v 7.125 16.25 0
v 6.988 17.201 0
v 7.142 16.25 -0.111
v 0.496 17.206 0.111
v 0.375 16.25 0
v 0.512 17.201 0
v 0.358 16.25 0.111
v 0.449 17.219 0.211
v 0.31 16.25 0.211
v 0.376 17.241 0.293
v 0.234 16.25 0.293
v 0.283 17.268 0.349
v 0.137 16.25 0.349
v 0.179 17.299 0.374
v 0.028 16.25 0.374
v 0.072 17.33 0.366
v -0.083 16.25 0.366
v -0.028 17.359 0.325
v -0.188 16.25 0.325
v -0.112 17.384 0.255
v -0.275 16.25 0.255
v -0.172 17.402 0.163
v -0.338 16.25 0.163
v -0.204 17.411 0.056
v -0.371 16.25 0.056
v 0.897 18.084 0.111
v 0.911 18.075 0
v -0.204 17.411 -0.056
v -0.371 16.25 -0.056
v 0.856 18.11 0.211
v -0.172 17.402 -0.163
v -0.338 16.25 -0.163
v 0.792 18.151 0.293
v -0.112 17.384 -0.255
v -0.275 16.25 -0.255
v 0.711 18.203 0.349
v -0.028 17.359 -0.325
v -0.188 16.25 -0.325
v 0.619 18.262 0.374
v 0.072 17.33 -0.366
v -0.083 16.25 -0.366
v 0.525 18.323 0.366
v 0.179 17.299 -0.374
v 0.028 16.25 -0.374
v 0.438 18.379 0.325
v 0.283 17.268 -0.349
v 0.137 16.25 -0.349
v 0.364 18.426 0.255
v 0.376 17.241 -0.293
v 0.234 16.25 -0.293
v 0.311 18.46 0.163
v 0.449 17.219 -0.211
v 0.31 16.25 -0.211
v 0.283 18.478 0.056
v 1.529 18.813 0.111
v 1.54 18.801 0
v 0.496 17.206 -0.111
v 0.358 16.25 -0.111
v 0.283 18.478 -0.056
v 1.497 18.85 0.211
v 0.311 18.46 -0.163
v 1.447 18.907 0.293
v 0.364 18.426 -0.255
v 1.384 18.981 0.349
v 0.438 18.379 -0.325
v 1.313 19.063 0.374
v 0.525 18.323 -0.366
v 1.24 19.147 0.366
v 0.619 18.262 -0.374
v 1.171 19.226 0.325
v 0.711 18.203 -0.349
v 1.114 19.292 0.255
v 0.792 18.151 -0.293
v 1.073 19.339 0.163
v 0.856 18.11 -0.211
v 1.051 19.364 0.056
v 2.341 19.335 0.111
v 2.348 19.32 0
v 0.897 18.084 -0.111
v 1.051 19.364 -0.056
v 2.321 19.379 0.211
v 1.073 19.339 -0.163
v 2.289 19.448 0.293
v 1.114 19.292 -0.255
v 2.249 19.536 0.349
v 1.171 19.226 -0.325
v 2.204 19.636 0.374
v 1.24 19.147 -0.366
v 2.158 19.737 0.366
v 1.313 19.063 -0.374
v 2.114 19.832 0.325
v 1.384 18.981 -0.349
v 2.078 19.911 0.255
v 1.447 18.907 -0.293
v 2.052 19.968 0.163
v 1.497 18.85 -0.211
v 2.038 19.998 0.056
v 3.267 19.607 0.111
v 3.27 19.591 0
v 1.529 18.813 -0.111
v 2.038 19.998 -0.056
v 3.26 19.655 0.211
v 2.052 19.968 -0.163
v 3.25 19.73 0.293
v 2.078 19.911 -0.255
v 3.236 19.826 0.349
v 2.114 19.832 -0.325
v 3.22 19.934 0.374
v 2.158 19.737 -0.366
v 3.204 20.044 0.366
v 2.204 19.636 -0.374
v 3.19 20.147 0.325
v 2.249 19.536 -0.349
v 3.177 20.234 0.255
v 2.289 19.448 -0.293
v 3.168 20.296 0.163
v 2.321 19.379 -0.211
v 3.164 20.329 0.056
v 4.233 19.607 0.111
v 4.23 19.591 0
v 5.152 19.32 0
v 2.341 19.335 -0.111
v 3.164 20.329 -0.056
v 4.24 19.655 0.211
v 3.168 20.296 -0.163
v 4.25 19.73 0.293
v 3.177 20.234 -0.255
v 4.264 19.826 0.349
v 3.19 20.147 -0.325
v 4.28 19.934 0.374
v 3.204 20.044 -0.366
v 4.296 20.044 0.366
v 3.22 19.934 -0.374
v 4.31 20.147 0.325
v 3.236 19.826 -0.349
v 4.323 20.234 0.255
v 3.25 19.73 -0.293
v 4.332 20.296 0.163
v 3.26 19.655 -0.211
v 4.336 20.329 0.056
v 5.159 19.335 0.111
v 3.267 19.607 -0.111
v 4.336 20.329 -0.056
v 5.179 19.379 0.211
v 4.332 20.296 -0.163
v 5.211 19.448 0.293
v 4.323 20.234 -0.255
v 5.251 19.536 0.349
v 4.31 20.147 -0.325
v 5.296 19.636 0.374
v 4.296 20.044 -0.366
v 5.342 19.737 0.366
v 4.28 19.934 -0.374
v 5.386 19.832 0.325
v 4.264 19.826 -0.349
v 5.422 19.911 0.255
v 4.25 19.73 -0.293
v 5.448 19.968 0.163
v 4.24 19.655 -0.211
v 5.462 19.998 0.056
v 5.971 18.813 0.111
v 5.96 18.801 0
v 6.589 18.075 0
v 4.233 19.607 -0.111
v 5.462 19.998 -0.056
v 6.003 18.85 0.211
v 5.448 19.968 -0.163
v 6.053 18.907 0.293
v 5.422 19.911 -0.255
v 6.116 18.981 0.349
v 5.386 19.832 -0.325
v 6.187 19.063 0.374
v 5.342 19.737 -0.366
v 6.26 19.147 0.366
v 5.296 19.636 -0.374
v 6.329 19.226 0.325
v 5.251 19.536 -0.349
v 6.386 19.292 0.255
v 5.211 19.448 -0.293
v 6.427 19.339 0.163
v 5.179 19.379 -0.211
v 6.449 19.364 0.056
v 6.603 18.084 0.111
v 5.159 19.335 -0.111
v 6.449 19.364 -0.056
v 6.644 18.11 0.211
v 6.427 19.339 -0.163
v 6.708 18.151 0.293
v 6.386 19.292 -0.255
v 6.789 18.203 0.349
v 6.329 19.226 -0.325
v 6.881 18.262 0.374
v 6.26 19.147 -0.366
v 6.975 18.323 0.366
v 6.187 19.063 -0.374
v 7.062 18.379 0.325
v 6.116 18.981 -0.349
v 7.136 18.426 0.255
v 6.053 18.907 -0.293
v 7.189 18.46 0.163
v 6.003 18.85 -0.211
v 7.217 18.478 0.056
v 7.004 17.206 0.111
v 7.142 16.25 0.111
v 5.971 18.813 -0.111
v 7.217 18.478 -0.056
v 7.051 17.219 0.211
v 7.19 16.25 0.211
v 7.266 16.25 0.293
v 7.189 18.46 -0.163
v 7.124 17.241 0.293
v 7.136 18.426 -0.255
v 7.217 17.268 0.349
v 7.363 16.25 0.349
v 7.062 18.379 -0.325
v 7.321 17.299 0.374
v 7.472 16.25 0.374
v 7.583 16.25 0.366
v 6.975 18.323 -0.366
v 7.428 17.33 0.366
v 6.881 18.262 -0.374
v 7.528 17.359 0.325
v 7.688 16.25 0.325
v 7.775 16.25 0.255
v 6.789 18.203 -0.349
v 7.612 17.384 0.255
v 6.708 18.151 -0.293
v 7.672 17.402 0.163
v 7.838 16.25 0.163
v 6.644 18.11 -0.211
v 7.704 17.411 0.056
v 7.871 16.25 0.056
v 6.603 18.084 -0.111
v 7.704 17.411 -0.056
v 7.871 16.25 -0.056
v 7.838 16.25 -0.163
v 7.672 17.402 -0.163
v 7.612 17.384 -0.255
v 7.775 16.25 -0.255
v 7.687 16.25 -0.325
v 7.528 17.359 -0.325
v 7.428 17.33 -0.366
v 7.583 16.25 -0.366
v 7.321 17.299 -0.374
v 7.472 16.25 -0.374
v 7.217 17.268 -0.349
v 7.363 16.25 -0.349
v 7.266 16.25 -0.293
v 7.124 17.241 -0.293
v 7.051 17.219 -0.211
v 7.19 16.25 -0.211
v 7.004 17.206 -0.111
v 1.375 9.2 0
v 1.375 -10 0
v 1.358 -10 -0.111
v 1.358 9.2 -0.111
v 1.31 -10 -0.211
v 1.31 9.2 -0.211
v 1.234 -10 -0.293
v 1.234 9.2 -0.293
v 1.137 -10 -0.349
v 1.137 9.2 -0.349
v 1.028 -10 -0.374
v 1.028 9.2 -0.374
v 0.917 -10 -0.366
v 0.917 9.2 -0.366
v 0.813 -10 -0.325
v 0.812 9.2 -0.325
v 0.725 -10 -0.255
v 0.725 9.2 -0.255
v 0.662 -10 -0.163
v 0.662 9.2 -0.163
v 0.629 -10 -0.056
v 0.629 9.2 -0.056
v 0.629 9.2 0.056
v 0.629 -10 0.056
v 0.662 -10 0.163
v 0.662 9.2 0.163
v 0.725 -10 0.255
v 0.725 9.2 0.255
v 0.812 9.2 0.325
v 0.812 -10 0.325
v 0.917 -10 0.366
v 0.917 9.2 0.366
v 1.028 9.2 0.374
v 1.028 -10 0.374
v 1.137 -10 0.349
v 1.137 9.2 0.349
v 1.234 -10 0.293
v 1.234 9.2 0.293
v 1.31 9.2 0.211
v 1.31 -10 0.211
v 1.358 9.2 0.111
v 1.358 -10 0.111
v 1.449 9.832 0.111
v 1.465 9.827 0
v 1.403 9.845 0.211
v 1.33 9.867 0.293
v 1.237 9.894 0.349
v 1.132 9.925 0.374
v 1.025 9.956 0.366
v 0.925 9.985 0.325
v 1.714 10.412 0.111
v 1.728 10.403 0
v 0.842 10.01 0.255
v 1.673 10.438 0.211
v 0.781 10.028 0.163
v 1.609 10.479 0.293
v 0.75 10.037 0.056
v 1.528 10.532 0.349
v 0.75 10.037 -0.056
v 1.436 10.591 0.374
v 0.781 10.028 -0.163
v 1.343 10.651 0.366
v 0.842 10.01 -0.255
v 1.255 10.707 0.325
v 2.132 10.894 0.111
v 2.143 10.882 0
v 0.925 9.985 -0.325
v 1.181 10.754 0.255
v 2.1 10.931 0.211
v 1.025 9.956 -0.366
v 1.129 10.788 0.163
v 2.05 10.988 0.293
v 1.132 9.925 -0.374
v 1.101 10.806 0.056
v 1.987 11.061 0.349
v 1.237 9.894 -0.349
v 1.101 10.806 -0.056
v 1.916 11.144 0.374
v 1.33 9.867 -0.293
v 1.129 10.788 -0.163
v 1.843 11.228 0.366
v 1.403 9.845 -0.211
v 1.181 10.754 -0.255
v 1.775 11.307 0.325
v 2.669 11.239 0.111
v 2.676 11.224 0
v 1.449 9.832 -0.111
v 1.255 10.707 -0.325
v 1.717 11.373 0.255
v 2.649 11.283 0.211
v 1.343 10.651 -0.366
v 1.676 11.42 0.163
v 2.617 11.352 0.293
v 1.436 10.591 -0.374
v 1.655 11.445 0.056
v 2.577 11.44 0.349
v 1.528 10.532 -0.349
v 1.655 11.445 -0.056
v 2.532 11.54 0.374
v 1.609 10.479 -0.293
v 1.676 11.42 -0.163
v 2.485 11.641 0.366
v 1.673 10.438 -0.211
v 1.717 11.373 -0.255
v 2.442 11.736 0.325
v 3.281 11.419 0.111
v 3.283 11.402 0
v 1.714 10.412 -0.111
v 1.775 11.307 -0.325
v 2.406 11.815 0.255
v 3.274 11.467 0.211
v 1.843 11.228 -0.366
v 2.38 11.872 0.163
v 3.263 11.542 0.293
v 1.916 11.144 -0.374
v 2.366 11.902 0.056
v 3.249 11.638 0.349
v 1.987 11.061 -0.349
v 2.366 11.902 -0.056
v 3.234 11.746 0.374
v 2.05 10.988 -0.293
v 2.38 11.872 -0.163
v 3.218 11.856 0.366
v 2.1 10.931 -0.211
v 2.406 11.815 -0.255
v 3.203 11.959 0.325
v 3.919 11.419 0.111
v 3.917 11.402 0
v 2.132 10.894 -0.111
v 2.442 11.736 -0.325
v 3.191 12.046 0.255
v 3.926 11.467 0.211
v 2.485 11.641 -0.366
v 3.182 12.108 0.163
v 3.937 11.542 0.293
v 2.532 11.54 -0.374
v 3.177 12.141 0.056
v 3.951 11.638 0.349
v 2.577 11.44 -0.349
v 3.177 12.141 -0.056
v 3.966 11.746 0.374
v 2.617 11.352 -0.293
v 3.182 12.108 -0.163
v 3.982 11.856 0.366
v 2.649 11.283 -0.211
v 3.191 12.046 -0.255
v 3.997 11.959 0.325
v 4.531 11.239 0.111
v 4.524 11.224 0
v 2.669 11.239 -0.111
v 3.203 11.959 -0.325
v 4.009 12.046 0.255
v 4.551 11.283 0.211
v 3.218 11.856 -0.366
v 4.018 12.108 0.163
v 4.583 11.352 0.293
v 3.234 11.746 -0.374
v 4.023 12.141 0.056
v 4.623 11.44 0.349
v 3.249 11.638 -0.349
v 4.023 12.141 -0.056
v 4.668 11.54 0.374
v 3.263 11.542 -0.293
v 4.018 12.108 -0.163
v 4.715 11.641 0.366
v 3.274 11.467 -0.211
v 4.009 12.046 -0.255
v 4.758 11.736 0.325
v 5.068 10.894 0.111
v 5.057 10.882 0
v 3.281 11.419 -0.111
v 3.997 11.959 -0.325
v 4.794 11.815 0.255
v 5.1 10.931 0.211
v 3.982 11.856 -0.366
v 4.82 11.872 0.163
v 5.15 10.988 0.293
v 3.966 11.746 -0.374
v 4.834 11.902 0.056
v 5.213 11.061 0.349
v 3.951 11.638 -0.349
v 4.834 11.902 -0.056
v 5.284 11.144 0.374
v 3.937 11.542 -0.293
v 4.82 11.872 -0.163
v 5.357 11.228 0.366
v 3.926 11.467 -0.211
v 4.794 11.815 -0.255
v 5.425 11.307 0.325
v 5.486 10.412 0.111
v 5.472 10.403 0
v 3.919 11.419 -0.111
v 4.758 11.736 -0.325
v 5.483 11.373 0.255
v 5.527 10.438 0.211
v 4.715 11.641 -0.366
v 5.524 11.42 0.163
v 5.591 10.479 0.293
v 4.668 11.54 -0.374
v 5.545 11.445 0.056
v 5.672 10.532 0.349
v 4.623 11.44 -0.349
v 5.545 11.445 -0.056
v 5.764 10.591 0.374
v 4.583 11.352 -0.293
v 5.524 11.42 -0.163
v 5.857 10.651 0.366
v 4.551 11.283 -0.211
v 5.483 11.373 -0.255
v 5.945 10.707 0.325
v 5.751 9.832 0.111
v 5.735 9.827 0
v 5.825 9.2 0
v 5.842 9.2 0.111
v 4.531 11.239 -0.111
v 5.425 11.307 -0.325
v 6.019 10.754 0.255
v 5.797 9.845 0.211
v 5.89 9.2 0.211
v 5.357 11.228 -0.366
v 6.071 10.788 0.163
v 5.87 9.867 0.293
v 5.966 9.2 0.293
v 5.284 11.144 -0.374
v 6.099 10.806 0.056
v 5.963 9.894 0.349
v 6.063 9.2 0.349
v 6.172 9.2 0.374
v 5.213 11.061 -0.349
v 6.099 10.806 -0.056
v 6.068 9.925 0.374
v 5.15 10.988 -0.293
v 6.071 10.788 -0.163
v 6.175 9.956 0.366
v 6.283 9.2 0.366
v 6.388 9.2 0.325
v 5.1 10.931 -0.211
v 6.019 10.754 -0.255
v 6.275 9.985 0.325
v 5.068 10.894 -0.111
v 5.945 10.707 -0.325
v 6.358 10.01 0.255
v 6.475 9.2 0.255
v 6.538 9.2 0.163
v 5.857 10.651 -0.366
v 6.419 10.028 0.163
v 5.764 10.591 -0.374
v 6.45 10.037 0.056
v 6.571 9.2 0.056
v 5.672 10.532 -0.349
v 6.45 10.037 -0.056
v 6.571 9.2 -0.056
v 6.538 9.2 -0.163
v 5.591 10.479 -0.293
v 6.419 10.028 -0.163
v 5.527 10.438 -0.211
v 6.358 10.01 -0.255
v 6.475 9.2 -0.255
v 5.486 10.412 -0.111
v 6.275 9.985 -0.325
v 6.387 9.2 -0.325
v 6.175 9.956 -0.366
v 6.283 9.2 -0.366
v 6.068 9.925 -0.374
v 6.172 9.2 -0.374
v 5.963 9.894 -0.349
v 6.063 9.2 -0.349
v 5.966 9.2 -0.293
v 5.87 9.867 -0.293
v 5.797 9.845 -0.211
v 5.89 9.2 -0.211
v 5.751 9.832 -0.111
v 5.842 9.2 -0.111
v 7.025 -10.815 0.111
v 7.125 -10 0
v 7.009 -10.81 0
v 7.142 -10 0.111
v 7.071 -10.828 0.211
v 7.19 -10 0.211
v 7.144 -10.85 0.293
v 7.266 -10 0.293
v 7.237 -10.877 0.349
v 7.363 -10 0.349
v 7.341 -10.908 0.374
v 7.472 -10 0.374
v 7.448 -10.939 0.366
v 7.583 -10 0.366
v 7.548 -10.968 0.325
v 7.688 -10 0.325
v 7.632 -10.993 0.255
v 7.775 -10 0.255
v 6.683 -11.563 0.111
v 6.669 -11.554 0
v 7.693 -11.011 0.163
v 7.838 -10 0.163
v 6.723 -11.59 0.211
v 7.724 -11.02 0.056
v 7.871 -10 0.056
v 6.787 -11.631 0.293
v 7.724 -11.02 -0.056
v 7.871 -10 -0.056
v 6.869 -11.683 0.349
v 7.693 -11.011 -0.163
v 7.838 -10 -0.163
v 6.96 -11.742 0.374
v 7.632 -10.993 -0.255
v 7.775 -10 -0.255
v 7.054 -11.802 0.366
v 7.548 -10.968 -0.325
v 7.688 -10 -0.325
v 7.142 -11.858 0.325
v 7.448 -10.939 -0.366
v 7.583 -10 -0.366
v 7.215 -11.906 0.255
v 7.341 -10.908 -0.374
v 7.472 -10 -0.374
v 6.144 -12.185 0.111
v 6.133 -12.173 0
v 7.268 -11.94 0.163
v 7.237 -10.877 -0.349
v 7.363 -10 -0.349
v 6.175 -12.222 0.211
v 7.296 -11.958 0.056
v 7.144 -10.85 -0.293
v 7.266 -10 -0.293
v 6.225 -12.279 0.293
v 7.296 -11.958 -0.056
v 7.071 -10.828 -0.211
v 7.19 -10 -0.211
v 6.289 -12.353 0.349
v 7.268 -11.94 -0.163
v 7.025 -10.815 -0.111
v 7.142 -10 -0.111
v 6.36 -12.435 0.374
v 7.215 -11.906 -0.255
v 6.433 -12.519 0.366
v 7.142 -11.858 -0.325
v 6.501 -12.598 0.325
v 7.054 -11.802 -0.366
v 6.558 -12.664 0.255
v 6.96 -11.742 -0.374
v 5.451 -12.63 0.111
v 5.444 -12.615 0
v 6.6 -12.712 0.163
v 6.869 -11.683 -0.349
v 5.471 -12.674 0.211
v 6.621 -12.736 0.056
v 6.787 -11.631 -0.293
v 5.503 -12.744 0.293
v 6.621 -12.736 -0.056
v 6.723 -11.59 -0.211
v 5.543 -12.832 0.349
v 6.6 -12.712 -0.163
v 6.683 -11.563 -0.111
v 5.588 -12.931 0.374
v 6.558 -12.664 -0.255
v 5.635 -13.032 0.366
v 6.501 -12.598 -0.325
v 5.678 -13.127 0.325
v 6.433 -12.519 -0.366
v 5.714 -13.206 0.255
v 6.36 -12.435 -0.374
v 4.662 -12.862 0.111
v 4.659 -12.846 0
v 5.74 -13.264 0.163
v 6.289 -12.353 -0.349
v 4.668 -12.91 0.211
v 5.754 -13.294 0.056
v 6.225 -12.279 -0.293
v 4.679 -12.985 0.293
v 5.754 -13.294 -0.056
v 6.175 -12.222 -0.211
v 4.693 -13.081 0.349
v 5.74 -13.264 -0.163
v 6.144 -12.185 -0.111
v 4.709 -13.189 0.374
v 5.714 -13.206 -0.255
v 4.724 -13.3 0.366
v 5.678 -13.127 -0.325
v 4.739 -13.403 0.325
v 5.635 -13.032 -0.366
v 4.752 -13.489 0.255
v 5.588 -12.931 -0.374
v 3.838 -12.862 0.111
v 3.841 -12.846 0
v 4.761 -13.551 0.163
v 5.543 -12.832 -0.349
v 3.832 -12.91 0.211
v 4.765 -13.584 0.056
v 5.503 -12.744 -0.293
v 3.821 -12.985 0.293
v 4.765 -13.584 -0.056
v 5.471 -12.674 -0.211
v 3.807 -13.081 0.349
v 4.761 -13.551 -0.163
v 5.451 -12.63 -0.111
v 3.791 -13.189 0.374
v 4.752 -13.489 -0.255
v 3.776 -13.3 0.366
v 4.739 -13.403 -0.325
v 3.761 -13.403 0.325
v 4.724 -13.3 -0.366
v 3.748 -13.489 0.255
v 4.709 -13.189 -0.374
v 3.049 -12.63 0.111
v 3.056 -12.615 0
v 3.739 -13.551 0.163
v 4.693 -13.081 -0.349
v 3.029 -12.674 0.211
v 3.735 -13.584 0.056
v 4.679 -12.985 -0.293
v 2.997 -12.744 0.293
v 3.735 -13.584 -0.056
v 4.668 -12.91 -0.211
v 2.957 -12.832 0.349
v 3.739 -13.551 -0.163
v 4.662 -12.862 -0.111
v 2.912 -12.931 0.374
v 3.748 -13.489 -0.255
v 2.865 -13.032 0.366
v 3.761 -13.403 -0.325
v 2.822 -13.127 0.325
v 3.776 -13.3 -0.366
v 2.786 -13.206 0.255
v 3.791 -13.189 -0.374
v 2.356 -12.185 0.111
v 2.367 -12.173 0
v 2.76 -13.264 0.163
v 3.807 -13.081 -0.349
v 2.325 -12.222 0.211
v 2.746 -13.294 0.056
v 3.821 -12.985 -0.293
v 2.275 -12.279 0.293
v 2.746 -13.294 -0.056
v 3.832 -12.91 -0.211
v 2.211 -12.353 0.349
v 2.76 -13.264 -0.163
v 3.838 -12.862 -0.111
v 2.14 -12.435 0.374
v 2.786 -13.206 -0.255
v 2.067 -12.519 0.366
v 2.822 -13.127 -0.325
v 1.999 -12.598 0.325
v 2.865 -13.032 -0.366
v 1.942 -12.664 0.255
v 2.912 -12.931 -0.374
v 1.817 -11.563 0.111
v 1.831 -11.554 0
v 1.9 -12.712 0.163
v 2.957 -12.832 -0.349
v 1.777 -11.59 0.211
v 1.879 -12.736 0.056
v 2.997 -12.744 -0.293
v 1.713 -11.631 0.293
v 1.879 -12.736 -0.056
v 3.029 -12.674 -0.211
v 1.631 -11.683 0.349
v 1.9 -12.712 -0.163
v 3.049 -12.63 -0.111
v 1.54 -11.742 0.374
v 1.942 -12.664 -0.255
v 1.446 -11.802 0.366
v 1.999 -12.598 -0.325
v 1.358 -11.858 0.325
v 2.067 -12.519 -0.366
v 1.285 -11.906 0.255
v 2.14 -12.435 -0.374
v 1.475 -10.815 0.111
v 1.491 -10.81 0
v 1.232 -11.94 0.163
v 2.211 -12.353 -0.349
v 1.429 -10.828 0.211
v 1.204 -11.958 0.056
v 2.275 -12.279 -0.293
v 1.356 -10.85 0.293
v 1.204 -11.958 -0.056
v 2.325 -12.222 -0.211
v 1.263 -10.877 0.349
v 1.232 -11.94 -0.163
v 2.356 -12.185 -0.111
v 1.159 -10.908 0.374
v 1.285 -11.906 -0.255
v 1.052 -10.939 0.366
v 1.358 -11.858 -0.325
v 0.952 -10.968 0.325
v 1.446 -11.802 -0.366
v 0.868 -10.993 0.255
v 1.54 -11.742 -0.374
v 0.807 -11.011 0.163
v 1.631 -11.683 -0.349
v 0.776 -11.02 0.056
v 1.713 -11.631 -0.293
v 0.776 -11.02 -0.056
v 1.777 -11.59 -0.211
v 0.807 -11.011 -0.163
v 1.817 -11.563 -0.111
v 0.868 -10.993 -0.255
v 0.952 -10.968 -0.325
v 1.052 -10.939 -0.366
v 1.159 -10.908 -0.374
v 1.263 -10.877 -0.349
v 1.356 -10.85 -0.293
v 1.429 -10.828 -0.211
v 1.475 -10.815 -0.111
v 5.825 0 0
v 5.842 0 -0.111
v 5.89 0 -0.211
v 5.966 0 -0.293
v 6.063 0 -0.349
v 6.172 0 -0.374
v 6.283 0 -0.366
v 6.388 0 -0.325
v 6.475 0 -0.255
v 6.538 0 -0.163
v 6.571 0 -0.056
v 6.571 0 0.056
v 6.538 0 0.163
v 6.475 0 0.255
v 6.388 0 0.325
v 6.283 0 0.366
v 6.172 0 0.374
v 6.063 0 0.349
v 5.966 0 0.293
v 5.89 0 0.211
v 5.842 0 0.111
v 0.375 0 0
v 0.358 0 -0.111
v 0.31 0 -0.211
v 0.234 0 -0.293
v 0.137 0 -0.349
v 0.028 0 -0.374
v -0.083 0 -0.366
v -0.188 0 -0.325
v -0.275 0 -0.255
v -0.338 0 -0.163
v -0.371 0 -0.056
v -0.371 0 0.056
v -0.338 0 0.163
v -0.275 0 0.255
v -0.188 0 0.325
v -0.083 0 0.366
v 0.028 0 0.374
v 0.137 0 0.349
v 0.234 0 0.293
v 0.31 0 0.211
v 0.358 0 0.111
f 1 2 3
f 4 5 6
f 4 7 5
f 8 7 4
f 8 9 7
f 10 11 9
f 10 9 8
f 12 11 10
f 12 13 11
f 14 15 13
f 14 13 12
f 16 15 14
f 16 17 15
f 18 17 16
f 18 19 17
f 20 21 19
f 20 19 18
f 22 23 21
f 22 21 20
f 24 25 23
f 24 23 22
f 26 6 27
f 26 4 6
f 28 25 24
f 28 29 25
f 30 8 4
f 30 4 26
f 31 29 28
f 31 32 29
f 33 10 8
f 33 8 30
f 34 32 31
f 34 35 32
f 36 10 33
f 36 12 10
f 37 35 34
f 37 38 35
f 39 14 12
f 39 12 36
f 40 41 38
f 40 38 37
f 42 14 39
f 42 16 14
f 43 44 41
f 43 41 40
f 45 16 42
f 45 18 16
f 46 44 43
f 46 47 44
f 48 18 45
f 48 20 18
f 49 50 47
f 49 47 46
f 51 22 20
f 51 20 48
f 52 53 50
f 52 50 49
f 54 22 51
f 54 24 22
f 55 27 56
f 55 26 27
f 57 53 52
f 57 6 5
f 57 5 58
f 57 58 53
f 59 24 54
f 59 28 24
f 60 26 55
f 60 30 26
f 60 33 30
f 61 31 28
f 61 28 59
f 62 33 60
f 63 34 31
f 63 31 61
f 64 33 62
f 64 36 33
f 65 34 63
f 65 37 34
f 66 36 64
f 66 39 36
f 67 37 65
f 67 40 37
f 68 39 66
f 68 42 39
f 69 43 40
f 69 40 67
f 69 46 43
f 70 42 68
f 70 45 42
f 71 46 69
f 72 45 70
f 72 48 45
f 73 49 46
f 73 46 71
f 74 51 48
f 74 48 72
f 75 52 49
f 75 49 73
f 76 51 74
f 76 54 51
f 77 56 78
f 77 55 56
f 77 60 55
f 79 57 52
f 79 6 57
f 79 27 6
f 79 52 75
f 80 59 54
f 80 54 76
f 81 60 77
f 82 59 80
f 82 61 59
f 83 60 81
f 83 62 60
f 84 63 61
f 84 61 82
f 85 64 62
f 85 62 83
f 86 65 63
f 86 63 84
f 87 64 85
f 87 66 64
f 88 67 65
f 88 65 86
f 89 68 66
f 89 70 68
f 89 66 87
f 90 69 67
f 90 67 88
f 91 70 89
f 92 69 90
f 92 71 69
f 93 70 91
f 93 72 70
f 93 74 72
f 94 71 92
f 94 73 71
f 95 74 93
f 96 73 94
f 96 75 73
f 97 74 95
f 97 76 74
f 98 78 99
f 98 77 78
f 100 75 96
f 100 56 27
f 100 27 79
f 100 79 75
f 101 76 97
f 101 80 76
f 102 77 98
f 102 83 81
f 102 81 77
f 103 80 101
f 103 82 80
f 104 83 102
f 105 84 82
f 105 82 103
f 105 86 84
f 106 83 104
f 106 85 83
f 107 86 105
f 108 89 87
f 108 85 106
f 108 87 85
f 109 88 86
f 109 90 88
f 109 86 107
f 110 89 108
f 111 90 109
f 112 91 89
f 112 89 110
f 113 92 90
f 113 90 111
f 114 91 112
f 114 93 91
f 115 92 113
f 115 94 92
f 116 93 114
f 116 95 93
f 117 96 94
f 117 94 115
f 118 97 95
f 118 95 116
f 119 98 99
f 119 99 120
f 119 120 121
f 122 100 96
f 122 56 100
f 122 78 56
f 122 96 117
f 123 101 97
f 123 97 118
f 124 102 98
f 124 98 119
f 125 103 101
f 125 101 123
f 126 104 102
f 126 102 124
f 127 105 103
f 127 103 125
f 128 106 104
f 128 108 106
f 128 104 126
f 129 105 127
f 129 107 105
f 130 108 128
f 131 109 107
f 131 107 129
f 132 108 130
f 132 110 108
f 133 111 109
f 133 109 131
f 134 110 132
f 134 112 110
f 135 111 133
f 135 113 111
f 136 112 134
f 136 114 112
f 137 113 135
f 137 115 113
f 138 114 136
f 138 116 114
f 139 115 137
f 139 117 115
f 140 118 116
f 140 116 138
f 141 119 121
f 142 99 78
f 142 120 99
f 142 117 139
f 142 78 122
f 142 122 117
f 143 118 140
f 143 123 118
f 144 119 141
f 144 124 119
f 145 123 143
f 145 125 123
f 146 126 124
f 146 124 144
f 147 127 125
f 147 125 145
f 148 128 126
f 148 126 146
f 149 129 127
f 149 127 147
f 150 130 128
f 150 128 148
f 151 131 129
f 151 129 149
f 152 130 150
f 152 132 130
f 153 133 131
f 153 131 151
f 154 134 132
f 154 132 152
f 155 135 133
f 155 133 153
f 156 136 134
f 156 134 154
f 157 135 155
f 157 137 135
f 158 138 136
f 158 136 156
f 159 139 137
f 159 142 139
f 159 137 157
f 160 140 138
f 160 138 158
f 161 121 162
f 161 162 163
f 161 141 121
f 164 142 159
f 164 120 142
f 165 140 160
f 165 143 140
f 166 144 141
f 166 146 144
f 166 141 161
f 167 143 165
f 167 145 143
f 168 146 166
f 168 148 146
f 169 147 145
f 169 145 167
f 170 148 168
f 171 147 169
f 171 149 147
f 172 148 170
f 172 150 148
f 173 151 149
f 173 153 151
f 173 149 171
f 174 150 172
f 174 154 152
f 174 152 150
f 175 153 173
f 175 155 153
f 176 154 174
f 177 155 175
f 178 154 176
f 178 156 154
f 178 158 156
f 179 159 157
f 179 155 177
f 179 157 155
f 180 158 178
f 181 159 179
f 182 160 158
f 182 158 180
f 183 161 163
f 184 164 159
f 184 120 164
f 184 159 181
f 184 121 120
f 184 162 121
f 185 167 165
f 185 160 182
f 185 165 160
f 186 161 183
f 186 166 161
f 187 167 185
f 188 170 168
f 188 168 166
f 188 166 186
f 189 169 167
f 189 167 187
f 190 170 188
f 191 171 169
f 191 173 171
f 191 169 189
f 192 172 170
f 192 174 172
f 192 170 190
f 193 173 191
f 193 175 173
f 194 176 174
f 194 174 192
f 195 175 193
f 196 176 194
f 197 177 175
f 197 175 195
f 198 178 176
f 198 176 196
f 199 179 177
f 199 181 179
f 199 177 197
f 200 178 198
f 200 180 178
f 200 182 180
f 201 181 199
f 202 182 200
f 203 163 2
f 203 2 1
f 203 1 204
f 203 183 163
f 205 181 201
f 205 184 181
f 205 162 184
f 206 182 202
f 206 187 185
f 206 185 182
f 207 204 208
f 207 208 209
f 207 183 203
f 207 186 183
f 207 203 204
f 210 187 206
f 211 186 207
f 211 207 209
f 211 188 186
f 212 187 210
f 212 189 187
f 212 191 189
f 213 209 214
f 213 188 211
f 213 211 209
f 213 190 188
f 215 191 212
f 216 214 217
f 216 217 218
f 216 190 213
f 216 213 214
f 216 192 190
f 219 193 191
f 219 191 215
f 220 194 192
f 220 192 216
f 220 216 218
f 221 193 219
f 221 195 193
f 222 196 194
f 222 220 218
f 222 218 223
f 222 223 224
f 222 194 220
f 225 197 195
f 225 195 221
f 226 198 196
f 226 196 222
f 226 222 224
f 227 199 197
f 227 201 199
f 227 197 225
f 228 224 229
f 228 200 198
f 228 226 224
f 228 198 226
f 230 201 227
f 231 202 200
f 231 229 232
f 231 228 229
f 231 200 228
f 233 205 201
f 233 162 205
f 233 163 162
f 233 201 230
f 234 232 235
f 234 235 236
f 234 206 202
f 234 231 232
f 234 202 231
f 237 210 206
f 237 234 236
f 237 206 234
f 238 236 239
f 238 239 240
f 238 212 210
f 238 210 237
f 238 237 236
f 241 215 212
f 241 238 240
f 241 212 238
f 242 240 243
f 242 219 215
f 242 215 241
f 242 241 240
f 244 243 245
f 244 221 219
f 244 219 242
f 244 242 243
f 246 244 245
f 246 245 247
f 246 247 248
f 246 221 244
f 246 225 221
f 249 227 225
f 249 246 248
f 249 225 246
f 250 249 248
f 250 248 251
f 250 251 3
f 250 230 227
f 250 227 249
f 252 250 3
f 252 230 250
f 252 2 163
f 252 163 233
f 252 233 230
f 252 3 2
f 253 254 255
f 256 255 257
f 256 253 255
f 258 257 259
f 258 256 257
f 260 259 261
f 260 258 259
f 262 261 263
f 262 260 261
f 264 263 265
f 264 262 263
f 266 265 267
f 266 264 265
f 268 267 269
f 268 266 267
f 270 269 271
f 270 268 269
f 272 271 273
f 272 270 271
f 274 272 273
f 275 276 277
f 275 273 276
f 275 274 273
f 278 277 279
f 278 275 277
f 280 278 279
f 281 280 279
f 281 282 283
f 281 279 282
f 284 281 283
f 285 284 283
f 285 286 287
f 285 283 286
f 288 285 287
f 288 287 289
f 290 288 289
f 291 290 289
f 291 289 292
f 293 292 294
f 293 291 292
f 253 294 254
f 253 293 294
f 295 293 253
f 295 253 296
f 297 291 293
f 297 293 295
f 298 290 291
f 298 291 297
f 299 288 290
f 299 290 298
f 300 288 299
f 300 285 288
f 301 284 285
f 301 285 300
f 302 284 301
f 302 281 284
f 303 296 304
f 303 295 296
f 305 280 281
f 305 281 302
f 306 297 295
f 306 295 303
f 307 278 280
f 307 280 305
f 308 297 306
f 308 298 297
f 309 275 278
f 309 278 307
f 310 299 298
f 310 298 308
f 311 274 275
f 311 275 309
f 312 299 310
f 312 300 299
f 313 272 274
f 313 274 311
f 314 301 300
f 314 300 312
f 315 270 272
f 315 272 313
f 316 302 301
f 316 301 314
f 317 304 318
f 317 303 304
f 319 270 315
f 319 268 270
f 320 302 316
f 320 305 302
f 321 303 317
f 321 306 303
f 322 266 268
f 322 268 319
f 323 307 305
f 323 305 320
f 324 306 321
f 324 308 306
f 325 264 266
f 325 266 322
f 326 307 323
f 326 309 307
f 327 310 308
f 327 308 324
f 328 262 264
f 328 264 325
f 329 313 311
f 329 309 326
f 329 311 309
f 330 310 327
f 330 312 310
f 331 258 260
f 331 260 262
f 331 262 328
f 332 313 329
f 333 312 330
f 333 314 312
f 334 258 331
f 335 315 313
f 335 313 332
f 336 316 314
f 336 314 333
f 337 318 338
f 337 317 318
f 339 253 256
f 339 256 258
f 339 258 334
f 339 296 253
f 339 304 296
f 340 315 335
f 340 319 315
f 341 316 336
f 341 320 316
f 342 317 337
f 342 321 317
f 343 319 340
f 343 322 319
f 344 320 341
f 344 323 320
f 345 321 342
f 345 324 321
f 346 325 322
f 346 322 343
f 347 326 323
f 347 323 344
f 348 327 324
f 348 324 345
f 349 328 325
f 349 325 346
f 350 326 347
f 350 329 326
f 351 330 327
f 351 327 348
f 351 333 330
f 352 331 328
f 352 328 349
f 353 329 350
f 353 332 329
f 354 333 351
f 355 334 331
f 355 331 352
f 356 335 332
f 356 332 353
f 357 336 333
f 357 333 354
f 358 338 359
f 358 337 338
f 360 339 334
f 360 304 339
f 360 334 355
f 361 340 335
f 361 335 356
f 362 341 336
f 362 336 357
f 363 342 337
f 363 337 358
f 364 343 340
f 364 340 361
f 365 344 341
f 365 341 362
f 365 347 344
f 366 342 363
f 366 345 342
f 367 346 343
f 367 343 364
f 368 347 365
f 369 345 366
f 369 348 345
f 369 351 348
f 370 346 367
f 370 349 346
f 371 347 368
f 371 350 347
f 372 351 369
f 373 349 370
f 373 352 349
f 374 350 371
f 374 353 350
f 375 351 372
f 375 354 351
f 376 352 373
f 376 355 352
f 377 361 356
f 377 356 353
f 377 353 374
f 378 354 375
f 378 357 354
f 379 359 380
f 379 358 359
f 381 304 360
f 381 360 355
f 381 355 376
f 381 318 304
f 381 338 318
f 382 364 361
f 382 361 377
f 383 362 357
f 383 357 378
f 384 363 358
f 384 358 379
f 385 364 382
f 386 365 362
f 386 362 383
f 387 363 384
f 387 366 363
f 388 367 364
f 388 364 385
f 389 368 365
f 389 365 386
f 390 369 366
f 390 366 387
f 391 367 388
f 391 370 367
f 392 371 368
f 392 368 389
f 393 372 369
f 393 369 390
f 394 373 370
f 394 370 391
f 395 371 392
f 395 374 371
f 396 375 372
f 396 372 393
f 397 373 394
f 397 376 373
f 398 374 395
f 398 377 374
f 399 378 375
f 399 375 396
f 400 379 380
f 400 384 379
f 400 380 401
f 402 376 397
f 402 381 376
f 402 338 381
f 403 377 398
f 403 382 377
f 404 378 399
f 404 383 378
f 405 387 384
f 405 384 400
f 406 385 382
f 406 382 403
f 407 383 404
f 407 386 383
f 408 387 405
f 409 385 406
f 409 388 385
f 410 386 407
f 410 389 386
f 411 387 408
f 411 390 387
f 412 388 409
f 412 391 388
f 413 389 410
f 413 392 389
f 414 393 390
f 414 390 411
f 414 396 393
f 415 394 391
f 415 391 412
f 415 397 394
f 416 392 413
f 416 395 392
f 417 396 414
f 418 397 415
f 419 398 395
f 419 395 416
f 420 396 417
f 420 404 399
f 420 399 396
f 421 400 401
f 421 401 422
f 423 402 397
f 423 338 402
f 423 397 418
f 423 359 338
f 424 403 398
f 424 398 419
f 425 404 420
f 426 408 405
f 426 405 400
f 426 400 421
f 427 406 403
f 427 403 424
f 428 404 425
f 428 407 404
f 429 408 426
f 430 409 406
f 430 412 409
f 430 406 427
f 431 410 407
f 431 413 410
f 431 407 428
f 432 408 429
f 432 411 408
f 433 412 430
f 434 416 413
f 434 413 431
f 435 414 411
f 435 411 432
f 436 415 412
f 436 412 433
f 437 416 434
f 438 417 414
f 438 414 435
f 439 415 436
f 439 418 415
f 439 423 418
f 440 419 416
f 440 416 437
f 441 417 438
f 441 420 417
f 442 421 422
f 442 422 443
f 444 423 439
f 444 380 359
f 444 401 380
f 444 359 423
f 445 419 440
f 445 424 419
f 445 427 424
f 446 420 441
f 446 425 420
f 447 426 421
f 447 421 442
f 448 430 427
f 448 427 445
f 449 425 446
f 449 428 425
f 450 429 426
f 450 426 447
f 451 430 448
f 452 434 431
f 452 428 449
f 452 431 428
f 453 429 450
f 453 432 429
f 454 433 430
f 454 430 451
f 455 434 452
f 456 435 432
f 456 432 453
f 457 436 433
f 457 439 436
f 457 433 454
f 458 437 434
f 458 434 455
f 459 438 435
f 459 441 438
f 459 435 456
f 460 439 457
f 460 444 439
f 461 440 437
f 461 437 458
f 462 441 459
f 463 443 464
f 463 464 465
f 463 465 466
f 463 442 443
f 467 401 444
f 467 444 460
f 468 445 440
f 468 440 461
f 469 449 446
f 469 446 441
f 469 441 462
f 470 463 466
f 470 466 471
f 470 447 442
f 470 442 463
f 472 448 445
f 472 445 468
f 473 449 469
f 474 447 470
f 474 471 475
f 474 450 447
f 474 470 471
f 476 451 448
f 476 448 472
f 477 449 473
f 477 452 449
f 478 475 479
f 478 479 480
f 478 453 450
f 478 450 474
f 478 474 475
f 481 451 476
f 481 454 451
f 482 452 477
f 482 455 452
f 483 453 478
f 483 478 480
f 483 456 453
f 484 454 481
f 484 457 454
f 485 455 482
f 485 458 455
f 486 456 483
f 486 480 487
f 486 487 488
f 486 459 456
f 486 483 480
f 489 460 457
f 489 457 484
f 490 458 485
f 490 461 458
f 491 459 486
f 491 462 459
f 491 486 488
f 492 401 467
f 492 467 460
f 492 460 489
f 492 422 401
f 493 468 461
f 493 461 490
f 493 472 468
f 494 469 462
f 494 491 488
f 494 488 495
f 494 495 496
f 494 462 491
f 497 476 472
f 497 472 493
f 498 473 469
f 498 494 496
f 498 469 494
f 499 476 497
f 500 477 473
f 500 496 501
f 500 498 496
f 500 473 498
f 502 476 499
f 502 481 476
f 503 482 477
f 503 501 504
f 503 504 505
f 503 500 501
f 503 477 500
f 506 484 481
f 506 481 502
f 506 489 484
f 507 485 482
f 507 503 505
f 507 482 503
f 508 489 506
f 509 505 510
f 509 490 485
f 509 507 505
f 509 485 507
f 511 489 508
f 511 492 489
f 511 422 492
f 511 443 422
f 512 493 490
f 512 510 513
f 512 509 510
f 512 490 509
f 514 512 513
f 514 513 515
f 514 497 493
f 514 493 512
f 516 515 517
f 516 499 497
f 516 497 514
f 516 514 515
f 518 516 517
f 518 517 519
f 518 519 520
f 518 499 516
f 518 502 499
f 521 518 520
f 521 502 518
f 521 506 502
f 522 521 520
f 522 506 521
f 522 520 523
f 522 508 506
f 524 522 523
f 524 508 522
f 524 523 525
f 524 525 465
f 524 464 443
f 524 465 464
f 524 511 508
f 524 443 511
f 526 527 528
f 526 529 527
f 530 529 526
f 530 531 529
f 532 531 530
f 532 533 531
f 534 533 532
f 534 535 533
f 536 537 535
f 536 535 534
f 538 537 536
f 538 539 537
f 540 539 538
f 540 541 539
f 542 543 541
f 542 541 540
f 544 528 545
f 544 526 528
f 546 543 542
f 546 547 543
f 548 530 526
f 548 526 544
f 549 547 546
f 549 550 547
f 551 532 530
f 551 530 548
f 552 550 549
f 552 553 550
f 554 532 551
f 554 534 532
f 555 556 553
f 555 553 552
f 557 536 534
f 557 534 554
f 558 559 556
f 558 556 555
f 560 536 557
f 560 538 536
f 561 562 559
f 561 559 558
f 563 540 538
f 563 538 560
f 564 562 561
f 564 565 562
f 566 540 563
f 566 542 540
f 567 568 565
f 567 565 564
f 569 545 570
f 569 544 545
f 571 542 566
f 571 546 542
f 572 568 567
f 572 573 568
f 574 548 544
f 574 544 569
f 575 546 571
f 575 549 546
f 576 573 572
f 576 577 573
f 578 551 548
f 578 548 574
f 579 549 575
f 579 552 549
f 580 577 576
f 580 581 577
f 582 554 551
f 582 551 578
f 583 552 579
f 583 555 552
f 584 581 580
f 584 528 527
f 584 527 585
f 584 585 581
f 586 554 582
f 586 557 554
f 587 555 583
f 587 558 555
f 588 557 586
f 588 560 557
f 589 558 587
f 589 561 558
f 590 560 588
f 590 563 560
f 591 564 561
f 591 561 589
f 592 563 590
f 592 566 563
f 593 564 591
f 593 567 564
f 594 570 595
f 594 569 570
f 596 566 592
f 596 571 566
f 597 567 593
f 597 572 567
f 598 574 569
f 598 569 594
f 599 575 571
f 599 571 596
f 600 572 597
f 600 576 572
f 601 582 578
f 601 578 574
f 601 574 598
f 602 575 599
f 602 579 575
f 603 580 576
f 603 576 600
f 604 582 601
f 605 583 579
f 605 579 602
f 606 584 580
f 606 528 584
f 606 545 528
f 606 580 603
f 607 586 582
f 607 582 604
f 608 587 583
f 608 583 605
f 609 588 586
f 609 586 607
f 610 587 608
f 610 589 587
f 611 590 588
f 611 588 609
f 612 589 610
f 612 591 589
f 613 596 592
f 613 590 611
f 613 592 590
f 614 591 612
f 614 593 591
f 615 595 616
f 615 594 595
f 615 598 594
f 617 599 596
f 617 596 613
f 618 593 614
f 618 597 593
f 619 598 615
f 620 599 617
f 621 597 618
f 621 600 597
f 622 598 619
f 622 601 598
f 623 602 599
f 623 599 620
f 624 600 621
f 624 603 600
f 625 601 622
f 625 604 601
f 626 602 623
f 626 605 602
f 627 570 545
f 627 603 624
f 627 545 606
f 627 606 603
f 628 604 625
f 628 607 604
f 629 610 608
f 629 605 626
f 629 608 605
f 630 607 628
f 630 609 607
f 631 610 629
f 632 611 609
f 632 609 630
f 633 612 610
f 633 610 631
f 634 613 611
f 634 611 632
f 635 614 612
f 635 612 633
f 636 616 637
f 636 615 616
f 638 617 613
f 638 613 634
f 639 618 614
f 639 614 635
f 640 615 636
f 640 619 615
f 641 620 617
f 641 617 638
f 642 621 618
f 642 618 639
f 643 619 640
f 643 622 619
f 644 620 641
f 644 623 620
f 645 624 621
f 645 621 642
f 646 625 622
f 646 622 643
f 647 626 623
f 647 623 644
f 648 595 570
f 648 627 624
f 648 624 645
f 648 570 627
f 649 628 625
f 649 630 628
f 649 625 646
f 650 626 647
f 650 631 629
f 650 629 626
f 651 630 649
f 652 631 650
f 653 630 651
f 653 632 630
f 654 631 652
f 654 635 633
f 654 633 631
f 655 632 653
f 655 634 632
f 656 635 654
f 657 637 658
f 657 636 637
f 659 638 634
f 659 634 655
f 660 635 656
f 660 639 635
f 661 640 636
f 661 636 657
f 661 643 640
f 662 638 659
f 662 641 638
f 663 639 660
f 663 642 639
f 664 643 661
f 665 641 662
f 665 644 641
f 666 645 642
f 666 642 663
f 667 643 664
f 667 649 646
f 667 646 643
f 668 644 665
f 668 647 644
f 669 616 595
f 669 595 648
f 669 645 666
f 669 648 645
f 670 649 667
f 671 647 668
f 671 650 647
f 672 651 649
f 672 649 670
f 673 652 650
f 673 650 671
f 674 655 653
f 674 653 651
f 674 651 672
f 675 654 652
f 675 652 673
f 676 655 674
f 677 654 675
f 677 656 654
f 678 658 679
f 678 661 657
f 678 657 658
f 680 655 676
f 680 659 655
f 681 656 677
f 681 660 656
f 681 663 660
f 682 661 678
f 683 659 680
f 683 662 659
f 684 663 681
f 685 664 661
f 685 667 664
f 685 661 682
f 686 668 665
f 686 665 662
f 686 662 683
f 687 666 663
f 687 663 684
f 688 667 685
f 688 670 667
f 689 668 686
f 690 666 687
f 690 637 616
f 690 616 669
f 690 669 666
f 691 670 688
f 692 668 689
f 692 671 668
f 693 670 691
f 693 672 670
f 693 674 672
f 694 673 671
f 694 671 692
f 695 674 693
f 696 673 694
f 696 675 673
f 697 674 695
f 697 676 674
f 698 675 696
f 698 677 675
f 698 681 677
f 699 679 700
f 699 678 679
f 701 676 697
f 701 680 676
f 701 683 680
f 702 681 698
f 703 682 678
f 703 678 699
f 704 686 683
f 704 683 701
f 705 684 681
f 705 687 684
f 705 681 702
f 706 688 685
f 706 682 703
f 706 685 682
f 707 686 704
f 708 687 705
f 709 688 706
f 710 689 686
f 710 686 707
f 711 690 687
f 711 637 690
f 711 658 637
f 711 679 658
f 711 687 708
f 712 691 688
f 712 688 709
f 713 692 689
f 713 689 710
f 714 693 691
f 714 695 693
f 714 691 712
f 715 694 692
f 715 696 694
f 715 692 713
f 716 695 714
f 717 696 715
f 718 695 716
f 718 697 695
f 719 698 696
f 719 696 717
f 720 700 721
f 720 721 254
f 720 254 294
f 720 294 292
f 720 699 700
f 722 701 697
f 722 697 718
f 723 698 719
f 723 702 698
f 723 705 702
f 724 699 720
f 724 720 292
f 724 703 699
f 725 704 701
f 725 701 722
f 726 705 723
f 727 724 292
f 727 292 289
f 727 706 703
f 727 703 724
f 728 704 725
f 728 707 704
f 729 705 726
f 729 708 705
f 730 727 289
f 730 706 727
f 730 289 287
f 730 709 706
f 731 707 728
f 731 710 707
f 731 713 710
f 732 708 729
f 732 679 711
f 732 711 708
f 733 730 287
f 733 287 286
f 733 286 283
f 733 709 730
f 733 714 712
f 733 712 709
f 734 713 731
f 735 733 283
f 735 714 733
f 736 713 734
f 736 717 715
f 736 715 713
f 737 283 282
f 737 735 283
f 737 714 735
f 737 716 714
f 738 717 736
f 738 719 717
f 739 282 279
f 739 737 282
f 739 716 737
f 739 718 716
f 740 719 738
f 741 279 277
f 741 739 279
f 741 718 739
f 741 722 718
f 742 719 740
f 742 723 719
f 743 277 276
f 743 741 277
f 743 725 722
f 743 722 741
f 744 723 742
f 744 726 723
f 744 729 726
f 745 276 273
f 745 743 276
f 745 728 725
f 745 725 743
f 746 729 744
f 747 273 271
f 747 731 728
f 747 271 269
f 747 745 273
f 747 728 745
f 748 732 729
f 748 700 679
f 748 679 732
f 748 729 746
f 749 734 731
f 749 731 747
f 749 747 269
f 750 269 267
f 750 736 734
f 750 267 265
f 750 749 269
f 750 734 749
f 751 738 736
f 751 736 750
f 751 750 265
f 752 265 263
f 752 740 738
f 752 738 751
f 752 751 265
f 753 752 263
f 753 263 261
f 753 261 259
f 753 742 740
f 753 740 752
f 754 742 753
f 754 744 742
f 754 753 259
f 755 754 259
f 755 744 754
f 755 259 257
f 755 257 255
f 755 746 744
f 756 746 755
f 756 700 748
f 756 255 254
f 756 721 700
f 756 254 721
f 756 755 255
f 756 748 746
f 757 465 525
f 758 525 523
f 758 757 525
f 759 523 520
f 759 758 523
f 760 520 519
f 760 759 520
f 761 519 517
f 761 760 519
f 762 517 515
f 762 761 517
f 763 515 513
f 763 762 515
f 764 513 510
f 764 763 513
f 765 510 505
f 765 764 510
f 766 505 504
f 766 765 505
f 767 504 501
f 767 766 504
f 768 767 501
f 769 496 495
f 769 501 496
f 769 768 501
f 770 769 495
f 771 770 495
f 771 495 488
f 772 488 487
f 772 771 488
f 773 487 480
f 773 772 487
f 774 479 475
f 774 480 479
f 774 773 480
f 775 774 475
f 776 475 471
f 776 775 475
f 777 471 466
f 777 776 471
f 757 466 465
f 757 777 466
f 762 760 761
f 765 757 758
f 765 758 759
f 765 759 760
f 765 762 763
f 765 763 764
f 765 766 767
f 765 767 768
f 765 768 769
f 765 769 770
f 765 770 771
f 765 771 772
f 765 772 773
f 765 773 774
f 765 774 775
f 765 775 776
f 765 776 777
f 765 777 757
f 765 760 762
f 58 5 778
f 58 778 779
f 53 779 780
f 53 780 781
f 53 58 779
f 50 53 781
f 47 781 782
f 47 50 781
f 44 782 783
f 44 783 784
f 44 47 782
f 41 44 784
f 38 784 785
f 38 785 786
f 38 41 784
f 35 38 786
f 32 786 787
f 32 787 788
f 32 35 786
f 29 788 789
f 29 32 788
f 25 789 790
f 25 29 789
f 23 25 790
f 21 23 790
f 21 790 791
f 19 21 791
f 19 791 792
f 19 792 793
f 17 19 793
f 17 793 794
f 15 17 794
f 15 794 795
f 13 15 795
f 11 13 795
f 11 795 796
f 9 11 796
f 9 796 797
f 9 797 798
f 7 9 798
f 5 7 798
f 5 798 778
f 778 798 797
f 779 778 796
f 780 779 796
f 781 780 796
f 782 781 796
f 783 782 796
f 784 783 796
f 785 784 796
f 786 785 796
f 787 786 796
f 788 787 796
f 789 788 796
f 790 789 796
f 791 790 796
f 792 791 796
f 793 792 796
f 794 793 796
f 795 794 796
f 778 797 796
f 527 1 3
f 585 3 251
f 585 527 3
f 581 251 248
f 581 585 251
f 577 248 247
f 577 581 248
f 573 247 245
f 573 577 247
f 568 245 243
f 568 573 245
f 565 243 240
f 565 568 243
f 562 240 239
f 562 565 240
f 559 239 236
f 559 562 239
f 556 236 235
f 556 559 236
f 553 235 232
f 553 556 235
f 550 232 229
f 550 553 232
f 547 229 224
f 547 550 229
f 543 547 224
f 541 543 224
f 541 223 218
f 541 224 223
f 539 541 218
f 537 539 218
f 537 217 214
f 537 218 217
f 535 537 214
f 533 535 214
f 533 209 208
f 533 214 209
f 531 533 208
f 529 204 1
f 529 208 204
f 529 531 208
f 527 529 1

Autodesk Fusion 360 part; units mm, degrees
sketch "sweep path" plane through (0, 0, 0) normal (0, 0, 1) x (1, 0, 0)
  line L0 (0, 0) -> (0, 16.25)
  line L1 (0, 16.25) -> (7.5, 16.25) construction
  line L2 (7.5, 16.25) -> (7.5, -10)
  line L3 (7.5, -10) -> (1, -10) construction
  line L4 (1, -10) -> (1, 9.2)
  line L5 (1, 9.2) -> (6.2, 9.2) construction
  line L6 (6.2, 9.2) -> (6.2, 0)
  arc A0 (7.5, 16.25) -> (0, 16.25) centre (3.75, 16.25) ccw
  arc A1 (6.2, 9.2) -> (1, 9.2) centre (3.6, 9.2) ccw
  arc A2 (1, -10) -> (7.5, -10) centre (4.25, -10) ccw
  dimension "d1" = 16.25
  dimension "d2" = 7.5
  dimension "d3" = 26.25
  dimension "d4" = 6.5
  dimension "d5" = 19.2
  dimension "d6" = 5.2
  dimension "d7" = 9.2
sketch "sweep profile" plane through (0, 0, 0) normal (0, 1, 0) x (1, 0, 0)
  circle A0 centre (0, 0) radius 0.375
  dimension "d8" = 0.75
sweep "Sweep1" add profiles "sweep profile" path "sweep path" along L0 A0 L2 A2 L4 A1 L6 section 1
